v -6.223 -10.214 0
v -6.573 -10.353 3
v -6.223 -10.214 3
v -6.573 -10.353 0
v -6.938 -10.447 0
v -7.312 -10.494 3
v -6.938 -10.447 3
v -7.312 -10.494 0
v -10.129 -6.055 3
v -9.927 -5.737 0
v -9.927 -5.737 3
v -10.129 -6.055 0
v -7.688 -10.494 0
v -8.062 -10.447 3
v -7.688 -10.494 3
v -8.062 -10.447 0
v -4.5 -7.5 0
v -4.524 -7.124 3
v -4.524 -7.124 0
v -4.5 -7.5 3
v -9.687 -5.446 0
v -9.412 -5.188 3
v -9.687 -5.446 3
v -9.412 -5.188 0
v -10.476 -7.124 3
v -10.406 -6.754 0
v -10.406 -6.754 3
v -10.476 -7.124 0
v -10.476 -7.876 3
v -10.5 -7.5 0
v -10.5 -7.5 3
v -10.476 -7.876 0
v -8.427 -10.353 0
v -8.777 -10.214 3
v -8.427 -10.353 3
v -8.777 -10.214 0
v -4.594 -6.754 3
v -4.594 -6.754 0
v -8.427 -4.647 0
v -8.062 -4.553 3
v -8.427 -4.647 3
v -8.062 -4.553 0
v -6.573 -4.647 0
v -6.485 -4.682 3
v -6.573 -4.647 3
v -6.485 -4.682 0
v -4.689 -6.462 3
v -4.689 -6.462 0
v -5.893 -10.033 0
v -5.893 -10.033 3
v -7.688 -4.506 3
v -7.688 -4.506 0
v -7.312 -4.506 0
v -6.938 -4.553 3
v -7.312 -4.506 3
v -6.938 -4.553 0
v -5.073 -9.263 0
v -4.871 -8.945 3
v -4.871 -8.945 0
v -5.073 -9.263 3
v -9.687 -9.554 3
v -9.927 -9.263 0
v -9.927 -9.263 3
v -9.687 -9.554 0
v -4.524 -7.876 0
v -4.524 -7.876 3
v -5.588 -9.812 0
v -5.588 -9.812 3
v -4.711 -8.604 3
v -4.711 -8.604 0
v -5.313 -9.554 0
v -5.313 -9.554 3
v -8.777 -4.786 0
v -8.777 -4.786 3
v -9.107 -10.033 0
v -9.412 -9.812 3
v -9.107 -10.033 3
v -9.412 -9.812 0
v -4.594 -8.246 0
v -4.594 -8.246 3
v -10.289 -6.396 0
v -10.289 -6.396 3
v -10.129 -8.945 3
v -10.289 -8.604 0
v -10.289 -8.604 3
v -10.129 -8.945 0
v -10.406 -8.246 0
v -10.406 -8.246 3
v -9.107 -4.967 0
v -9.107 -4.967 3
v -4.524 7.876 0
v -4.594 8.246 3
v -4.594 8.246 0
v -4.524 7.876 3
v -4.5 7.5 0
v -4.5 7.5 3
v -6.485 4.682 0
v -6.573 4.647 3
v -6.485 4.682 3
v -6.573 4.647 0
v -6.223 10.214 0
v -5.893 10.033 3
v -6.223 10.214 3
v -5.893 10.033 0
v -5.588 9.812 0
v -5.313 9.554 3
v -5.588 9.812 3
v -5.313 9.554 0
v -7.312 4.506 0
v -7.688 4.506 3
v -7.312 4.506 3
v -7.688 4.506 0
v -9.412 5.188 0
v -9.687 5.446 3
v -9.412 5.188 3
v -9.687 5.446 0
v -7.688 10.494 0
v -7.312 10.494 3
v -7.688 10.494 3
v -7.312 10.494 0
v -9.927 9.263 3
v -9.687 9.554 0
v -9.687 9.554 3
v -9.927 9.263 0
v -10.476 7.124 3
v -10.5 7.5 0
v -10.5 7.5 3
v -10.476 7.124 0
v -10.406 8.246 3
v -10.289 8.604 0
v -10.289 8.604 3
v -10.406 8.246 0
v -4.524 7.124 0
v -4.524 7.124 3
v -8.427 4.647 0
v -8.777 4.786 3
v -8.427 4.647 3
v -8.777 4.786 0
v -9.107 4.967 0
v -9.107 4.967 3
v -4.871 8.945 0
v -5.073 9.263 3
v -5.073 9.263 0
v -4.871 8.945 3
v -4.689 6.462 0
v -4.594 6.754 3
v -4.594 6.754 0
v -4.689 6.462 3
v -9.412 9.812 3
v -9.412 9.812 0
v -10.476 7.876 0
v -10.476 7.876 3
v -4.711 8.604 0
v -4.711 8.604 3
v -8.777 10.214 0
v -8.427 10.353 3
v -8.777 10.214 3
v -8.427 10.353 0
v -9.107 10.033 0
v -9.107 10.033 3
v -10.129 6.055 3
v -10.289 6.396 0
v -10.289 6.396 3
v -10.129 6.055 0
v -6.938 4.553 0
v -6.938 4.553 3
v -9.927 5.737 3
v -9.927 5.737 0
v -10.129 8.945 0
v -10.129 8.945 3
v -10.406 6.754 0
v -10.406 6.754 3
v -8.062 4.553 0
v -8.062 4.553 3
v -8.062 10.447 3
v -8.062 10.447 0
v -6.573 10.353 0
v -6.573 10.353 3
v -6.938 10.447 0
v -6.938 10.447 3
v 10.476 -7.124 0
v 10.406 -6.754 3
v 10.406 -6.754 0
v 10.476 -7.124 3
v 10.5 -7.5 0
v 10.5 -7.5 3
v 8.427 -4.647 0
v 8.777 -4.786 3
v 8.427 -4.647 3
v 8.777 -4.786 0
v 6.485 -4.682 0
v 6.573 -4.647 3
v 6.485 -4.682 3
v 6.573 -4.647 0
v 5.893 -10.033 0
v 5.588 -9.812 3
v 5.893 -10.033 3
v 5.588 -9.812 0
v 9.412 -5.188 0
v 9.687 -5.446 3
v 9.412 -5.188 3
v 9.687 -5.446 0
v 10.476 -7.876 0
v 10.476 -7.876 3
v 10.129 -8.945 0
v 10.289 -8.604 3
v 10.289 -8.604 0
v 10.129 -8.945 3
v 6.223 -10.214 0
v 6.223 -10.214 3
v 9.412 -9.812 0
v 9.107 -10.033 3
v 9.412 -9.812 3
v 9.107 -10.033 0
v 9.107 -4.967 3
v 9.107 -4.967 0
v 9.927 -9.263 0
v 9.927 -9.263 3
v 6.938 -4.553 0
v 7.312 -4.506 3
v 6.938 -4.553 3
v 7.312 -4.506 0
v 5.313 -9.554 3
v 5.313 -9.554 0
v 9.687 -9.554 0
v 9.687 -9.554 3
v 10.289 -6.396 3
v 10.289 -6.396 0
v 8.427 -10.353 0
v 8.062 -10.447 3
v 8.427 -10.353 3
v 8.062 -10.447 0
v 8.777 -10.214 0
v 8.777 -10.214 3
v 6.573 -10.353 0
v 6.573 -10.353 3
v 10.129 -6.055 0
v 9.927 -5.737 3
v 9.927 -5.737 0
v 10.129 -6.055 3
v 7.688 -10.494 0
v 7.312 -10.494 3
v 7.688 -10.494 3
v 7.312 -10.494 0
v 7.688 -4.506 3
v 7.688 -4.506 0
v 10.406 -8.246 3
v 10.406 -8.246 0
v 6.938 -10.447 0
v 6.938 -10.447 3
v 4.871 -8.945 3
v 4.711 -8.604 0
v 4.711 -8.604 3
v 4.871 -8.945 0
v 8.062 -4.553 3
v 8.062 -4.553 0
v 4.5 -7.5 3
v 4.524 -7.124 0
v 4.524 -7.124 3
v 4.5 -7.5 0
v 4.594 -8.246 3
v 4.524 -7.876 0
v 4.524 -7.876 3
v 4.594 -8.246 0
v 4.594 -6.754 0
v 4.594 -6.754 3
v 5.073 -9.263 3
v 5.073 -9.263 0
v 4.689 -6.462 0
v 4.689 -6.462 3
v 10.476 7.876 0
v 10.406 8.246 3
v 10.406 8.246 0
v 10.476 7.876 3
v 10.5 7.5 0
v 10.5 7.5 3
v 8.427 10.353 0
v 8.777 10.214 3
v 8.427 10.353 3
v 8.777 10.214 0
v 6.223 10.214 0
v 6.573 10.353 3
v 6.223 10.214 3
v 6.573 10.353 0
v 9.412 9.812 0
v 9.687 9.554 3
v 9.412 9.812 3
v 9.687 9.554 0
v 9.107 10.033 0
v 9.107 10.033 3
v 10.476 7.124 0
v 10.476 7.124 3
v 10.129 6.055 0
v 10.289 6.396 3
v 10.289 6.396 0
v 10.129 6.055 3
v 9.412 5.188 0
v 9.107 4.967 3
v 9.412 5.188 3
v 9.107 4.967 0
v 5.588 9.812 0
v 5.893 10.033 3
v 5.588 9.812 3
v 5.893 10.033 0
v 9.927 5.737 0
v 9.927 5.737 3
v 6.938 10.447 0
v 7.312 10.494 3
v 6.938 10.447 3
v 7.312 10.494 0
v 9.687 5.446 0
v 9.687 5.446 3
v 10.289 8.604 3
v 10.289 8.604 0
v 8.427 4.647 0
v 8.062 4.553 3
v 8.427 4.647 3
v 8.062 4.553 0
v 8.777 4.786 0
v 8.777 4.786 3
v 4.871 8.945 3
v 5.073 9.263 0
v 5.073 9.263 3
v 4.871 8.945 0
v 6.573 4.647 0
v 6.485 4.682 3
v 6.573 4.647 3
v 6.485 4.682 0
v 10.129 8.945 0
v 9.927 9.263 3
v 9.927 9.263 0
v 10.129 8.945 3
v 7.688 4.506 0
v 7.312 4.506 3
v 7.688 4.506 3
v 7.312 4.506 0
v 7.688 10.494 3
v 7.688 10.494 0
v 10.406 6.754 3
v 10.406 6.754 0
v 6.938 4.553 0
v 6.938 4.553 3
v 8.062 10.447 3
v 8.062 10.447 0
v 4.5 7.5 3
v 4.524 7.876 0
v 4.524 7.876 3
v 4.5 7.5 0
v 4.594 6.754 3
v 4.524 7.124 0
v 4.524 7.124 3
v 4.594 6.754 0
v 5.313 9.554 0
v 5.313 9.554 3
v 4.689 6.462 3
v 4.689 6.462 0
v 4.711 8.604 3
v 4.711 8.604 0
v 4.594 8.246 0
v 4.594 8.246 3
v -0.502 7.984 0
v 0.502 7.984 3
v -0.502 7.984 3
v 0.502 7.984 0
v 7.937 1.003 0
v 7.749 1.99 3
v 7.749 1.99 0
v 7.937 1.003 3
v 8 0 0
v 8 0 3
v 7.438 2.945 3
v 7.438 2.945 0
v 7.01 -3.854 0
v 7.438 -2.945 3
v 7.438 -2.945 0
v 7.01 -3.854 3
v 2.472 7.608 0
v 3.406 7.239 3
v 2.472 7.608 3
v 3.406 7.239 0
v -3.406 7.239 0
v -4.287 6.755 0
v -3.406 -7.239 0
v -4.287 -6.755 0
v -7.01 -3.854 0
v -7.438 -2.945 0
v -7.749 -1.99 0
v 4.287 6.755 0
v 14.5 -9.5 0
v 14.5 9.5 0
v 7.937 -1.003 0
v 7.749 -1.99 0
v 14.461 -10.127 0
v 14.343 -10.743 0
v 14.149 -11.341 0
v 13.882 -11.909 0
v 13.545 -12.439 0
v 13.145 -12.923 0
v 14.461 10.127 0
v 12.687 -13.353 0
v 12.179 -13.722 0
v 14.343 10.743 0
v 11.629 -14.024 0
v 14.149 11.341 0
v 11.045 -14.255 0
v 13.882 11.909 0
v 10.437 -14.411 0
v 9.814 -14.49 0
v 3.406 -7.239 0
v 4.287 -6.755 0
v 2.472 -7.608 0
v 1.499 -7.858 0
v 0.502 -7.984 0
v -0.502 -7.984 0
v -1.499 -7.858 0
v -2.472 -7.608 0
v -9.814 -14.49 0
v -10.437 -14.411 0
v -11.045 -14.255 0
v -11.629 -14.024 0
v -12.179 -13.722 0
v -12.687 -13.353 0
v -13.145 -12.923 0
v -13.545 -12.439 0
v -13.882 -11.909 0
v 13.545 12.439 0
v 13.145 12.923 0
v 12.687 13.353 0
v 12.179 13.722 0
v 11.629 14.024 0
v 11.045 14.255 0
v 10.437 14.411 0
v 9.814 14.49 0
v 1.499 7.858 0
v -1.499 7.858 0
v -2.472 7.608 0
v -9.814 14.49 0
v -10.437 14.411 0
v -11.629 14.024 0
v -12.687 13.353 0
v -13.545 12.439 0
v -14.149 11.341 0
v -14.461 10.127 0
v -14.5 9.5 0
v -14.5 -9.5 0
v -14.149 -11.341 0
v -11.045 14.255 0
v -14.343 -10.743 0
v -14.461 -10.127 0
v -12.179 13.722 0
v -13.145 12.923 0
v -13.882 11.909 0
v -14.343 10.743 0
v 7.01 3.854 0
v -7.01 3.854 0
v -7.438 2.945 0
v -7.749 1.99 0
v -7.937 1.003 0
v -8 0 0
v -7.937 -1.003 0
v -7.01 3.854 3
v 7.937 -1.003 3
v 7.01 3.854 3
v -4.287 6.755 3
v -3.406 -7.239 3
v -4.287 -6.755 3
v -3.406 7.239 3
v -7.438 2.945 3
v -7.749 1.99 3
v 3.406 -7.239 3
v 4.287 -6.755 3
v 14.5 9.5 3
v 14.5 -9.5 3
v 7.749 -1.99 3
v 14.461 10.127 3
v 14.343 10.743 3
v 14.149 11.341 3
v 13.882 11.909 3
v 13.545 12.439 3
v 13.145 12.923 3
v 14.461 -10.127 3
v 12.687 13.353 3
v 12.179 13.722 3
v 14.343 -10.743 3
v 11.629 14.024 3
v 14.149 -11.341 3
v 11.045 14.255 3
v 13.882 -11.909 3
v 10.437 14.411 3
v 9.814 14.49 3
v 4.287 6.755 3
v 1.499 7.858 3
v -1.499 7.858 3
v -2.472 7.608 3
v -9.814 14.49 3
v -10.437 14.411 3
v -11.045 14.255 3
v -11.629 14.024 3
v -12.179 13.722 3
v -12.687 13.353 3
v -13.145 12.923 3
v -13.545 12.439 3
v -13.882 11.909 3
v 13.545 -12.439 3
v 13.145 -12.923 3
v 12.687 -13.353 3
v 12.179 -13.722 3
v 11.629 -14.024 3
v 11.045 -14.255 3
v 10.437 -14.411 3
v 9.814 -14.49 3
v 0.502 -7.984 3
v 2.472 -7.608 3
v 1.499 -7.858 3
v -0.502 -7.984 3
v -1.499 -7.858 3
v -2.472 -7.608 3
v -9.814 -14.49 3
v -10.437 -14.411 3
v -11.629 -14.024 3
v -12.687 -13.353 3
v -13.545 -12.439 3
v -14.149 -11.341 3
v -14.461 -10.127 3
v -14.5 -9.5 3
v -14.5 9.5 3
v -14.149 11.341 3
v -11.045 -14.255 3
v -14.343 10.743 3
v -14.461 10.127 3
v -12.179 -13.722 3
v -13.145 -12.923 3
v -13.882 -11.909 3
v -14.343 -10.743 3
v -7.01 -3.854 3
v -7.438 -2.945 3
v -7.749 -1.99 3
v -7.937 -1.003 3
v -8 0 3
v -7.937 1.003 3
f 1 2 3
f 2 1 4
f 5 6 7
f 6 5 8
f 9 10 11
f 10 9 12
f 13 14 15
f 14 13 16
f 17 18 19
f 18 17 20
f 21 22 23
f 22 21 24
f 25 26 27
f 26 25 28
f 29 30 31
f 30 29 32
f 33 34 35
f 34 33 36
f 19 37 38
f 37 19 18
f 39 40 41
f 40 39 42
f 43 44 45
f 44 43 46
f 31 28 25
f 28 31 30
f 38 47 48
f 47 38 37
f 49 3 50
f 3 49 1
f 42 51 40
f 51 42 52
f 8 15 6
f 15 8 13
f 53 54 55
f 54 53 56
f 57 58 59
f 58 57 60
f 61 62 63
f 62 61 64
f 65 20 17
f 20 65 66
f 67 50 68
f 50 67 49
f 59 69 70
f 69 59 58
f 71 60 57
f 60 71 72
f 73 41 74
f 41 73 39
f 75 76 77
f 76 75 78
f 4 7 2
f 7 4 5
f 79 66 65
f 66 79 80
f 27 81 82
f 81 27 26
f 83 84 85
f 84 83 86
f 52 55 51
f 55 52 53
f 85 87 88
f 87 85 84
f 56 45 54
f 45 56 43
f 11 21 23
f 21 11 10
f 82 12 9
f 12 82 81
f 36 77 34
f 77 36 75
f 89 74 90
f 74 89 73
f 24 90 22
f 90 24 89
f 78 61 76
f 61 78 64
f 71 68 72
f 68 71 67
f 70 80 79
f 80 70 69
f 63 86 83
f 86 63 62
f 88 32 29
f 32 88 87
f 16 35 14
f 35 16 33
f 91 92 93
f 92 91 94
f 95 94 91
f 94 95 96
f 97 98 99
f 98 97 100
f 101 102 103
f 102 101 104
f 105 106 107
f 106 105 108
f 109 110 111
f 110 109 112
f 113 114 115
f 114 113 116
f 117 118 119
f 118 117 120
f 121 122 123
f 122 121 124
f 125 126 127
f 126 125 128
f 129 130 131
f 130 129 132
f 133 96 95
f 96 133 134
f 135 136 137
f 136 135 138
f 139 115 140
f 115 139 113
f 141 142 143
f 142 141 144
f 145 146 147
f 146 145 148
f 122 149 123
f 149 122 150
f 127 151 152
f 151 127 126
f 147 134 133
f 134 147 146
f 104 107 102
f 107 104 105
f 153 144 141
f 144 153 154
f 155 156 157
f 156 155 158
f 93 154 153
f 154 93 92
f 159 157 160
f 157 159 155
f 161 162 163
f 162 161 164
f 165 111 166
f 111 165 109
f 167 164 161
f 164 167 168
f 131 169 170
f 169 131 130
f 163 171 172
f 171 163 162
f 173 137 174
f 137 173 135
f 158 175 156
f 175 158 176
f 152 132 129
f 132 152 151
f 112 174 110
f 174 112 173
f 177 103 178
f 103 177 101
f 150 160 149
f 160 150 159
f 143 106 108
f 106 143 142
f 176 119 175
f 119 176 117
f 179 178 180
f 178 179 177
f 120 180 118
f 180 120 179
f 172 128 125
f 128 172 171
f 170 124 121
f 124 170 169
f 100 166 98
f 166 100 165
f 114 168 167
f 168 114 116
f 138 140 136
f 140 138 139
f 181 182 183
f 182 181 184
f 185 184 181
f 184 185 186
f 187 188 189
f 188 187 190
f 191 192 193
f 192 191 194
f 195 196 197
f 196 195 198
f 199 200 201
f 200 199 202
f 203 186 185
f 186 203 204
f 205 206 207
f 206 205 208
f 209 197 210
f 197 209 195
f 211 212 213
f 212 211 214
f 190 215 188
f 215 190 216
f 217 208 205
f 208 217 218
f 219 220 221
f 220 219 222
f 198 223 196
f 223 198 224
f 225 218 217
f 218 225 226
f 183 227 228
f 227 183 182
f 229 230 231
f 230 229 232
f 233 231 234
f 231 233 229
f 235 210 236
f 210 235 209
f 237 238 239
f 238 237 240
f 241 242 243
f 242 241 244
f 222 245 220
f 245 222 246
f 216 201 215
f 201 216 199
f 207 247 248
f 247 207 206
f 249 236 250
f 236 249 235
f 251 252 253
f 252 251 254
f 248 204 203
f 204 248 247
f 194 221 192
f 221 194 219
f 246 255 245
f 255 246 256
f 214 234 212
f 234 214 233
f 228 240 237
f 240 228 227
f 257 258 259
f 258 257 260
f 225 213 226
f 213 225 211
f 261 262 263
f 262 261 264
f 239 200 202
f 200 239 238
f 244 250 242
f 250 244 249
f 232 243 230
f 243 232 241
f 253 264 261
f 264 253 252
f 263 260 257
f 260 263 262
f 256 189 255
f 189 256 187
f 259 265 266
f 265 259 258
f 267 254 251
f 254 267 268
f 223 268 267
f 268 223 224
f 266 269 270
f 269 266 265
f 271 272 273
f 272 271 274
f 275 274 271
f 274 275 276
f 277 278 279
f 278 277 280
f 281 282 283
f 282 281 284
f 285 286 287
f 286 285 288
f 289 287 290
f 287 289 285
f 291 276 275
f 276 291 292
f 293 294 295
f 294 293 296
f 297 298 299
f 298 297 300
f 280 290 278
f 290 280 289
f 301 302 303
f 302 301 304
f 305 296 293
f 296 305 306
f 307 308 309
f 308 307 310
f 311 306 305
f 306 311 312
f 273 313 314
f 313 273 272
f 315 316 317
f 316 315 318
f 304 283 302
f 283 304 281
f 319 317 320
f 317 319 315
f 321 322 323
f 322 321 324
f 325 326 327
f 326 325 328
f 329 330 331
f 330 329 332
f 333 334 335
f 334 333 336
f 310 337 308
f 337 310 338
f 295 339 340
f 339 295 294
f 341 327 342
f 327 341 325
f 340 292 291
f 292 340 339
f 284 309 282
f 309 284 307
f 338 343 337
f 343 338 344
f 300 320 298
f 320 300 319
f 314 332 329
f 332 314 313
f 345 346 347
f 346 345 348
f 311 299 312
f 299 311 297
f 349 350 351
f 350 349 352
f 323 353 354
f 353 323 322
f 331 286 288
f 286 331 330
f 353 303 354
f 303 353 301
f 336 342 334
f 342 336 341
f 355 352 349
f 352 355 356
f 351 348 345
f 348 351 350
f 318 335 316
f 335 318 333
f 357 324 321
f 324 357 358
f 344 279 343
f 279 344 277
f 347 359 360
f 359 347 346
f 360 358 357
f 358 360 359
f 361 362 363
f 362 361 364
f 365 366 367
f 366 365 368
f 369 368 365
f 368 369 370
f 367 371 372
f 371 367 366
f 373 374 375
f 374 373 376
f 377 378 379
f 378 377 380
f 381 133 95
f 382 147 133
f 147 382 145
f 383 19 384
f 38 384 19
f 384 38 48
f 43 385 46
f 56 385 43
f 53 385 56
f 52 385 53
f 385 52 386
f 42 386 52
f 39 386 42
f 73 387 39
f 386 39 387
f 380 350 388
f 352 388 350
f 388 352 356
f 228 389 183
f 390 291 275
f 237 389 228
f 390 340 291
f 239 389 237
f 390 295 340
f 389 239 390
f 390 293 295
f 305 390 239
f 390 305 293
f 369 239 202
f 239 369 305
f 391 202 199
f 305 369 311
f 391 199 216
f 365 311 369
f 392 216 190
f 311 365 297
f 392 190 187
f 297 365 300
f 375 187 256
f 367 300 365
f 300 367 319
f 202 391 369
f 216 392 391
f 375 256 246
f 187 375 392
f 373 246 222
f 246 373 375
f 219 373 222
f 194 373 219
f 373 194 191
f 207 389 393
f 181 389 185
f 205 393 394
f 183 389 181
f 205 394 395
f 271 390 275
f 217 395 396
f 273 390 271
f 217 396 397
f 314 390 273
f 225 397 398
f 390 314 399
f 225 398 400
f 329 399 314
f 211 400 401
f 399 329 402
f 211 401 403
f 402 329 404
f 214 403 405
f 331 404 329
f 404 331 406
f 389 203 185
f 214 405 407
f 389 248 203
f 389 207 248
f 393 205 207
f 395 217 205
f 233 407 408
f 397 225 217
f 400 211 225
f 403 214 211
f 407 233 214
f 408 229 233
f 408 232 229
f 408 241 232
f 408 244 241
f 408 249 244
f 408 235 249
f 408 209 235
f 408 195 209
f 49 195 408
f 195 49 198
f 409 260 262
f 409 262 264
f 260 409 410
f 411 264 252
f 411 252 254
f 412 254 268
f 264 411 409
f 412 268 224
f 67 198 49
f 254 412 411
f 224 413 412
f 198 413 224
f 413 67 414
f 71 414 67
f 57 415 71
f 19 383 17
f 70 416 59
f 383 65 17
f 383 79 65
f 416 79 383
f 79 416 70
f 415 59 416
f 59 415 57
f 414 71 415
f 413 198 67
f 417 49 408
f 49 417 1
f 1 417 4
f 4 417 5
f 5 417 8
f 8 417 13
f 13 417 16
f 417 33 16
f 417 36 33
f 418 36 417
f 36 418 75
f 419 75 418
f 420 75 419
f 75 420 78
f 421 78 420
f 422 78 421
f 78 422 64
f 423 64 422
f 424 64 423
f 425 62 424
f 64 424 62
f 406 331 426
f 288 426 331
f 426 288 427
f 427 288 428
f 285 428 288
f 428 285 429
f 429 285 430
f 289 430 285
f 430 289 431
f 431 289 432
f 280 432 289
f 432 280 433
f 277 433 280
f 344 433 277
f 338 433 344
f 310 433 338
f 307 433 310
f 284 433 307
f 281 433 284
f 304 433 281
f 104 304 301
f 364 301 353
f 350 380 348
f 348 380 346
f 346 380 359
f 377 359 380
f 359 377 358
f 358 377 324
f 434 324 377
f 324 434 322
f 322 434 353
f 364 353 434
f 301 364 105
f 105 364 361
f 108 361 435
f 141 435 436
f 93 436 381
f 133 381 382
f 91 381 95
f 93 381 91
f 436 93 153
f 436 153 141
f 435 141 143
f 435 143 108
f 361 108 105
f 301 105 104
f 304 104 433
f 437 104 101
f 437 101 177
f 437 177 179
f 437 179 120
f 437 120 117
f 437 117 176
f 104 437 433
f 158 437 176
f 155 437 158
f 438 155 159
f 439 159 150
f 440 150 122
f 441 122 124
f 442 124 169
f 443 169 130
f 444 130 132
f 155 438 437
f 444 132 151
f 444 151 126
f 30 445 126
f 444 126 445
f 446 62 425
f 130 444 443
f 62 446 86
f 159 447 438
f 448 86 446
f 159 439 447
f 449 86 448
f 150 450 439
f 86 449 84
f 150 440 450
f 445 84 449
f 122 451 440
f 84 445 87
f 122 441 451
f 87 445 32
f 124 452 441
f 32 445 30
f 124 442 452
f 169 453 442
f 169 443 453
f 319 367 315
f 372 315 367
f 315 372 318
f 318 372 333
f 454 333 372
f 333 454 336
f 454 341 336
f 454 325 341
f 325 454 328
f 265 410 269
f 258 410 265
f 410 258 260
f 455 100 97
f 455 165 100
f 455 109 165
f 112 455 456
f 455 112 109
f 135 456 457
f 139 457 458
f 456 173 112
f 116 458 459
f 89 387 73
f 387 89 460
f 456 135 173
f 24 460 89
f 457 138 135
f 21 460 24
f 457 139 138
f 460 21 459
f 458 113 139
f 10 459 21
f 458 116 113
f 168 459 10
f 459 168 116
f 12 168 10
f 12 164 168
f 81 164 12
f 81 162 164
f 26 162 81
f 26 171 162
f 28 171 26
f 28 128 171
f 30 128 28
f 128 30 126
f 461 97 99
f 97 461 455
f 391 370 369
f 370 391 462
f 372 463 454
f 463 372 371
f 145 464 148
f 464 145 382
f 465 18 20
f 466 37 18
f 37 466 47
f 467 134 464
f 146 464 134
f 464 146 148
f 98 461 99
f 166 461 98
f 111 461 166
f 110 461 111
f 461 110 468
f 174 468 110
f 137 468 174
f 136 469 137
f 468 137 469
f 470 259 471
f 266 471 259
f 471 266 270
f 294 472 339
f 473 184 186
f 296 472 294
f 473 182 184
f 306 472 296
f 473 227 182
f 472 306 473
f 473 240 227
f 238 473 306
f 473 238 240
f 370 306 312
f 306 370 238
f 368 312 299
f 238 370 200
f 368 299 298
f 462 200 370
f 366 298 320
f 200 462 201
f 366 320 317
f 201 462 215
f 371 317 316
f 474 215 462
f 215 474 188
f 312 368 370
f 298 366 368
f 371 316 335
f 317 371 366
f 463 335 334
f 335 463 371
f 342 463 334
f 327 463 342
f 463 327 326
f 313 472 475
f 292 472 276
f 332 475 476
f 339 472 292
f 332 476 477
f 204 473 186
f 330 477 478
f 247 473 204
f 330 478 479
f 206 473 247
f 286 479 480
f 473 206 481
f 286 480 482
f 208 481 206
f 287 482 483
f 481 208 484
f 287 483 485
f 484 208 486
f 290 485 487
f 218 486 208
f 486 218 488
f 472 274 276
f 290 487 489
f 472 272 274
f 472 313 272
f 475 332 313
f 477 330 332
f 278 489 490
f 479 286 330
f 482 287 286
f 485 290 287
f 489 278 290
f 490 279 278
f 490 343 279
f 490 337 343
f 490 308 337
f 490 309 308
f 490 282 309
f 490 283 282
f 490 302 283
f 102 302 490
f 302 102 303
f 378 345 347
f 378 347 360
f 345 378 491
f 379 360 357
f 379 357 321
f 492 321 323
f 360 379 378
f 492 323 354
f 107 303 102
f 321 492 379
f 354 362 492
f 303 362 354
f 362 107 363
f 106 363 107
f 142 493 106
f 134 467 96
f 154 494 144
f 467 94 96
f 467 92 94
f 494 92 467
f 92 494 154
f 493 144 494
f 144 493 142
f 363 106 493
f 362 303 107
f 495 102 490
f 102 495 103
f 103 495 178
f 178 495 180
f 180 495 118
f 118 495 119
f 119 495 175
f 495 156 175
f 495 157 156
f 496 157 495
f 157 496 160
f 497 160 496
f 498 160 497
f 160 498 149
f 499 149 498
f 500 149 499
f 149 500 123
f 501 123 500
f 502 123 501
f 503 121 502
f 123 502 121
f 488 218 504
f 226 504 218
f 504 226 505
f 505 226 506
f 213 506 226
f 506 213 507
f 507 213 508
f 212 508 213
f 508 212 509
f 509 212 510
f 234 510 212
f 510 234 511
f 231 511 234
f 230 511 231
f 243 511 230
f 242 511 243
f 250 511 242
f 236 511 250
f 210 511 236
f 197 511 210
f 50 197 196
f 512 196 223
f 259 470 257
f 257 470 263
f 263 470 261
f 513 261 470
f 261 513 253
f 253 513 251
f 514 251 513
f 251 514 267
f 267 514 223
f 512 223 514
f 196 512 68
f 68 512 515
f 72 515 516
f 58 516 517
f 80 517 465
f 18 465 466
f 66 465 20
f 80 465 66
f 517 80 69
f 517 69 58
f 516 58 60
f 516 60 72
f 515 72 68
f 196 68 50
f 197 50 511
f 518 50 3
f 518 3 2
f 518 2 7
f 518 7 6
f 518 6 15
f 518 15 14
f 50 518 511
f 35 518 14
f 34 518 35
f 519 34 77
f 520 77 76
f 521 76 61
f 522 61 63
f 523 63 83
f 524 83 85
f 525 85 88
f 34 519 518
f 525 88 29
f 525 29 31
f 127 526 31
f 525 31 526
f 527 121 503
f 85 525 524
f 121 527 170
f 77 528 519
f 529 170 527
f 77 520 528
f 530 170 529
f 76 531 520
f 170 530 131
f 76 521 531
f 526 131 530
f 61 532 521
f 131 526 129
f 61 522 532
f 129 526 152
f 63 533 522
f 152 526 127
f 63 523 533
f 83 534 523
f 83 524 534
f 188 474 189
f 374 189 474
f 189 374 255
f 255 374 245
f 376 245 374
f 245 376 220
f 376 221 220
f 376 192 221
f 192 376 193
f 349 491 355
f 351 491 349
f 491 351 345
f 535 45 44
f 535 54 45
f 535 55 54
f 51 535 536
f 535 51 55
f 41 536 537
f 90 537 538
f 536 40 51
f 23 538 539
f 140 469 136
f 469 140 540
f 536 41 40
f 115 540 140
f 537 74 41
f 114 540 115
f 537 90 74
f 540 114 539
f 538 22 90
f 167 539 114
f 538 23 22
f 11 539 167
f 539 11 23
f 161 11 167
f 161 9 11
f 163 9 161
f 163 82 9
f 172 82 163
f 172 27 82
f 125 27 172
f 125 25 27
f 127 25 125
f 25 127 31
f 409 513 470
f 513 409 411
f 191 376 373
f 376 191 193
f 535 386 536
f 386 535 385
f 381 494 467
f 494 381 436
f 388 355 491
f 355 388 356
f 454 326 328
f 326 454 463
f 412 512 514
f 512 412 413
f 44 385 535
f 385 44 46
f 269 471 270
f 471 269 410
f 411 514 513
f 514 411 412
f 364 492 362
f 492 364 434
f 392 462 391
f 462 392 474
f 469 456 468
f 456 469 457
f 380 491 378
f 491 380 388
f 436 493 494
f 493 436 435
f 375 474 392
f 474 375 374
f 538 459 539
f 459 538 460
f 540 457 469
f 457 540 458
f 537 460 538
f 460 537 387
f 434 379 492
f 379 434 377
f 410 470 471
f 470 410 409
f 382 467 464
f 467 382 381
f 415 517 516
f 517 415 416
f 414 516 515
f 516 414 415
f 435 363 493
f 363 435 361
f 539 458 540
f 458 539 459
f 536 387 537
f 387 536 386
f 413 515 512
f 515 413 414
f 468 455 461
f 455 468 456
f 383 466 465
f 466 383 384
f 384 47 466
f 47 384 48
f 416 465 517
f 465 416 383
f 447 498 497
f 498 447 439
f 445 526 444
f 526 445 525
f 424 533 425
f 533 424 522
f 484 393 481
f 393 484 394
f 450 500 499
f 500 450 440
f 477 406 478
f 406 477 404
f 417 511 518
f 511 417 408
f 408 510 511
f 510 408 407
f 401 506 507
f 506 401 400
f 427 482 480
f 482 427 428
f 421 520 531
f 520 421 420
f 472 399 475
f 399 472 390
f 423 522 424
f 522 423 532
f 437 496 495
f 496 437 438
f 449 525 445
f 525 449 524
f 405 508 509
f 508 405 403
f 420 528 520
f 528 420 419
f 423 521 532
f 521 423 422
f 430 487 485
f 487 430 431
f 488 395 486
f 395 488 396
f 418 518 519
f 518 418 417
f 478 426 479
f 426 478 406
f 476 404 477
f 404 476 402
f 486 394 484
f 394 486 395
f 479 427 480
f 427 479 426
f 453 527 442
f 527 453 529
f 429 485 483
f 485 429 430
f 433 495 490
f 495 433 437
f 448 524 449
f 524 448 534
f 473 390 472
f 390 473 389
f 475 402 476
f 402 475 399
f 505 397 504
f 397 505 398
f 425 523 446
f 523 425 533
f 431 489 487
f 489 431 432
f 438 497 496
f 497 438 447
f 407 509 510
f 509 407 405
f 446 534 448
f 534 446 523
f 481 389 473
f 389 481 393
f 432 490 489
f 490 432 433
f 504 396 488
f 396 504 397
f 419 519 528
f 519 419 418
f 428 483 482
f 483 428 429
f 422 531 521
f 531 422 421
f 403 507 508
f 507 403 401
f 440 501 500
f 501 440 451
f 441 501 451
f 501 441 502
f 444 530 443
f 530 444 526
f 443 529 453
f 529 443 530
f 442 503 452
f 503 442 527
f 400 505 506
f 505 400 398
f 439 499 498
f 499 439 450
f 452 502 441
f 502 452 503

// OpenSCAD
$fn = 50;


difference() {
	union() {
		hull() {
			translate(v = [-9.5000000000, 9.5000000000, 0]) {
				cylinder(h = 3, r = 5);
			}
			translate(v = [9.5000000000, 9.5000000000, 0]) {
				cylinder(h = 3, r = 5);
			}
			translate(v = [-9.5000000000, -9.5000000000, 0]) {
				cylinder(h = 3, r = 5);
			}
			translate(v = [9.5000000000, -9.5000000000, 0]) {
				cylinder(h = 3, r = 5);
			}
		}
	}
	union() {
		#translate(v = [-7.5000000000, -7.5000000000, -100.0000000000]) {
			cylinder(h = 200, r = 3.0000000000);
		}
		#translate(v = [-7.5000000000, 7.5000000000, -100.0000000000]) {
			cylinder(h = 200, r = 3.0000000000);
		}
		#translate(v = [7.5000000000, -7.5000000000, -100.0000000000]) {
			cylinder(h = 200, r = 3.0000000000);
		}
		#translate(v = [7.5000000000, 7.5000000000, -100.0000000000]) {
			cylinder(h = 200, r = 3.0000000000);
		}
		#cylinder(h = 3, r = 8.0000000000);
	}
}
